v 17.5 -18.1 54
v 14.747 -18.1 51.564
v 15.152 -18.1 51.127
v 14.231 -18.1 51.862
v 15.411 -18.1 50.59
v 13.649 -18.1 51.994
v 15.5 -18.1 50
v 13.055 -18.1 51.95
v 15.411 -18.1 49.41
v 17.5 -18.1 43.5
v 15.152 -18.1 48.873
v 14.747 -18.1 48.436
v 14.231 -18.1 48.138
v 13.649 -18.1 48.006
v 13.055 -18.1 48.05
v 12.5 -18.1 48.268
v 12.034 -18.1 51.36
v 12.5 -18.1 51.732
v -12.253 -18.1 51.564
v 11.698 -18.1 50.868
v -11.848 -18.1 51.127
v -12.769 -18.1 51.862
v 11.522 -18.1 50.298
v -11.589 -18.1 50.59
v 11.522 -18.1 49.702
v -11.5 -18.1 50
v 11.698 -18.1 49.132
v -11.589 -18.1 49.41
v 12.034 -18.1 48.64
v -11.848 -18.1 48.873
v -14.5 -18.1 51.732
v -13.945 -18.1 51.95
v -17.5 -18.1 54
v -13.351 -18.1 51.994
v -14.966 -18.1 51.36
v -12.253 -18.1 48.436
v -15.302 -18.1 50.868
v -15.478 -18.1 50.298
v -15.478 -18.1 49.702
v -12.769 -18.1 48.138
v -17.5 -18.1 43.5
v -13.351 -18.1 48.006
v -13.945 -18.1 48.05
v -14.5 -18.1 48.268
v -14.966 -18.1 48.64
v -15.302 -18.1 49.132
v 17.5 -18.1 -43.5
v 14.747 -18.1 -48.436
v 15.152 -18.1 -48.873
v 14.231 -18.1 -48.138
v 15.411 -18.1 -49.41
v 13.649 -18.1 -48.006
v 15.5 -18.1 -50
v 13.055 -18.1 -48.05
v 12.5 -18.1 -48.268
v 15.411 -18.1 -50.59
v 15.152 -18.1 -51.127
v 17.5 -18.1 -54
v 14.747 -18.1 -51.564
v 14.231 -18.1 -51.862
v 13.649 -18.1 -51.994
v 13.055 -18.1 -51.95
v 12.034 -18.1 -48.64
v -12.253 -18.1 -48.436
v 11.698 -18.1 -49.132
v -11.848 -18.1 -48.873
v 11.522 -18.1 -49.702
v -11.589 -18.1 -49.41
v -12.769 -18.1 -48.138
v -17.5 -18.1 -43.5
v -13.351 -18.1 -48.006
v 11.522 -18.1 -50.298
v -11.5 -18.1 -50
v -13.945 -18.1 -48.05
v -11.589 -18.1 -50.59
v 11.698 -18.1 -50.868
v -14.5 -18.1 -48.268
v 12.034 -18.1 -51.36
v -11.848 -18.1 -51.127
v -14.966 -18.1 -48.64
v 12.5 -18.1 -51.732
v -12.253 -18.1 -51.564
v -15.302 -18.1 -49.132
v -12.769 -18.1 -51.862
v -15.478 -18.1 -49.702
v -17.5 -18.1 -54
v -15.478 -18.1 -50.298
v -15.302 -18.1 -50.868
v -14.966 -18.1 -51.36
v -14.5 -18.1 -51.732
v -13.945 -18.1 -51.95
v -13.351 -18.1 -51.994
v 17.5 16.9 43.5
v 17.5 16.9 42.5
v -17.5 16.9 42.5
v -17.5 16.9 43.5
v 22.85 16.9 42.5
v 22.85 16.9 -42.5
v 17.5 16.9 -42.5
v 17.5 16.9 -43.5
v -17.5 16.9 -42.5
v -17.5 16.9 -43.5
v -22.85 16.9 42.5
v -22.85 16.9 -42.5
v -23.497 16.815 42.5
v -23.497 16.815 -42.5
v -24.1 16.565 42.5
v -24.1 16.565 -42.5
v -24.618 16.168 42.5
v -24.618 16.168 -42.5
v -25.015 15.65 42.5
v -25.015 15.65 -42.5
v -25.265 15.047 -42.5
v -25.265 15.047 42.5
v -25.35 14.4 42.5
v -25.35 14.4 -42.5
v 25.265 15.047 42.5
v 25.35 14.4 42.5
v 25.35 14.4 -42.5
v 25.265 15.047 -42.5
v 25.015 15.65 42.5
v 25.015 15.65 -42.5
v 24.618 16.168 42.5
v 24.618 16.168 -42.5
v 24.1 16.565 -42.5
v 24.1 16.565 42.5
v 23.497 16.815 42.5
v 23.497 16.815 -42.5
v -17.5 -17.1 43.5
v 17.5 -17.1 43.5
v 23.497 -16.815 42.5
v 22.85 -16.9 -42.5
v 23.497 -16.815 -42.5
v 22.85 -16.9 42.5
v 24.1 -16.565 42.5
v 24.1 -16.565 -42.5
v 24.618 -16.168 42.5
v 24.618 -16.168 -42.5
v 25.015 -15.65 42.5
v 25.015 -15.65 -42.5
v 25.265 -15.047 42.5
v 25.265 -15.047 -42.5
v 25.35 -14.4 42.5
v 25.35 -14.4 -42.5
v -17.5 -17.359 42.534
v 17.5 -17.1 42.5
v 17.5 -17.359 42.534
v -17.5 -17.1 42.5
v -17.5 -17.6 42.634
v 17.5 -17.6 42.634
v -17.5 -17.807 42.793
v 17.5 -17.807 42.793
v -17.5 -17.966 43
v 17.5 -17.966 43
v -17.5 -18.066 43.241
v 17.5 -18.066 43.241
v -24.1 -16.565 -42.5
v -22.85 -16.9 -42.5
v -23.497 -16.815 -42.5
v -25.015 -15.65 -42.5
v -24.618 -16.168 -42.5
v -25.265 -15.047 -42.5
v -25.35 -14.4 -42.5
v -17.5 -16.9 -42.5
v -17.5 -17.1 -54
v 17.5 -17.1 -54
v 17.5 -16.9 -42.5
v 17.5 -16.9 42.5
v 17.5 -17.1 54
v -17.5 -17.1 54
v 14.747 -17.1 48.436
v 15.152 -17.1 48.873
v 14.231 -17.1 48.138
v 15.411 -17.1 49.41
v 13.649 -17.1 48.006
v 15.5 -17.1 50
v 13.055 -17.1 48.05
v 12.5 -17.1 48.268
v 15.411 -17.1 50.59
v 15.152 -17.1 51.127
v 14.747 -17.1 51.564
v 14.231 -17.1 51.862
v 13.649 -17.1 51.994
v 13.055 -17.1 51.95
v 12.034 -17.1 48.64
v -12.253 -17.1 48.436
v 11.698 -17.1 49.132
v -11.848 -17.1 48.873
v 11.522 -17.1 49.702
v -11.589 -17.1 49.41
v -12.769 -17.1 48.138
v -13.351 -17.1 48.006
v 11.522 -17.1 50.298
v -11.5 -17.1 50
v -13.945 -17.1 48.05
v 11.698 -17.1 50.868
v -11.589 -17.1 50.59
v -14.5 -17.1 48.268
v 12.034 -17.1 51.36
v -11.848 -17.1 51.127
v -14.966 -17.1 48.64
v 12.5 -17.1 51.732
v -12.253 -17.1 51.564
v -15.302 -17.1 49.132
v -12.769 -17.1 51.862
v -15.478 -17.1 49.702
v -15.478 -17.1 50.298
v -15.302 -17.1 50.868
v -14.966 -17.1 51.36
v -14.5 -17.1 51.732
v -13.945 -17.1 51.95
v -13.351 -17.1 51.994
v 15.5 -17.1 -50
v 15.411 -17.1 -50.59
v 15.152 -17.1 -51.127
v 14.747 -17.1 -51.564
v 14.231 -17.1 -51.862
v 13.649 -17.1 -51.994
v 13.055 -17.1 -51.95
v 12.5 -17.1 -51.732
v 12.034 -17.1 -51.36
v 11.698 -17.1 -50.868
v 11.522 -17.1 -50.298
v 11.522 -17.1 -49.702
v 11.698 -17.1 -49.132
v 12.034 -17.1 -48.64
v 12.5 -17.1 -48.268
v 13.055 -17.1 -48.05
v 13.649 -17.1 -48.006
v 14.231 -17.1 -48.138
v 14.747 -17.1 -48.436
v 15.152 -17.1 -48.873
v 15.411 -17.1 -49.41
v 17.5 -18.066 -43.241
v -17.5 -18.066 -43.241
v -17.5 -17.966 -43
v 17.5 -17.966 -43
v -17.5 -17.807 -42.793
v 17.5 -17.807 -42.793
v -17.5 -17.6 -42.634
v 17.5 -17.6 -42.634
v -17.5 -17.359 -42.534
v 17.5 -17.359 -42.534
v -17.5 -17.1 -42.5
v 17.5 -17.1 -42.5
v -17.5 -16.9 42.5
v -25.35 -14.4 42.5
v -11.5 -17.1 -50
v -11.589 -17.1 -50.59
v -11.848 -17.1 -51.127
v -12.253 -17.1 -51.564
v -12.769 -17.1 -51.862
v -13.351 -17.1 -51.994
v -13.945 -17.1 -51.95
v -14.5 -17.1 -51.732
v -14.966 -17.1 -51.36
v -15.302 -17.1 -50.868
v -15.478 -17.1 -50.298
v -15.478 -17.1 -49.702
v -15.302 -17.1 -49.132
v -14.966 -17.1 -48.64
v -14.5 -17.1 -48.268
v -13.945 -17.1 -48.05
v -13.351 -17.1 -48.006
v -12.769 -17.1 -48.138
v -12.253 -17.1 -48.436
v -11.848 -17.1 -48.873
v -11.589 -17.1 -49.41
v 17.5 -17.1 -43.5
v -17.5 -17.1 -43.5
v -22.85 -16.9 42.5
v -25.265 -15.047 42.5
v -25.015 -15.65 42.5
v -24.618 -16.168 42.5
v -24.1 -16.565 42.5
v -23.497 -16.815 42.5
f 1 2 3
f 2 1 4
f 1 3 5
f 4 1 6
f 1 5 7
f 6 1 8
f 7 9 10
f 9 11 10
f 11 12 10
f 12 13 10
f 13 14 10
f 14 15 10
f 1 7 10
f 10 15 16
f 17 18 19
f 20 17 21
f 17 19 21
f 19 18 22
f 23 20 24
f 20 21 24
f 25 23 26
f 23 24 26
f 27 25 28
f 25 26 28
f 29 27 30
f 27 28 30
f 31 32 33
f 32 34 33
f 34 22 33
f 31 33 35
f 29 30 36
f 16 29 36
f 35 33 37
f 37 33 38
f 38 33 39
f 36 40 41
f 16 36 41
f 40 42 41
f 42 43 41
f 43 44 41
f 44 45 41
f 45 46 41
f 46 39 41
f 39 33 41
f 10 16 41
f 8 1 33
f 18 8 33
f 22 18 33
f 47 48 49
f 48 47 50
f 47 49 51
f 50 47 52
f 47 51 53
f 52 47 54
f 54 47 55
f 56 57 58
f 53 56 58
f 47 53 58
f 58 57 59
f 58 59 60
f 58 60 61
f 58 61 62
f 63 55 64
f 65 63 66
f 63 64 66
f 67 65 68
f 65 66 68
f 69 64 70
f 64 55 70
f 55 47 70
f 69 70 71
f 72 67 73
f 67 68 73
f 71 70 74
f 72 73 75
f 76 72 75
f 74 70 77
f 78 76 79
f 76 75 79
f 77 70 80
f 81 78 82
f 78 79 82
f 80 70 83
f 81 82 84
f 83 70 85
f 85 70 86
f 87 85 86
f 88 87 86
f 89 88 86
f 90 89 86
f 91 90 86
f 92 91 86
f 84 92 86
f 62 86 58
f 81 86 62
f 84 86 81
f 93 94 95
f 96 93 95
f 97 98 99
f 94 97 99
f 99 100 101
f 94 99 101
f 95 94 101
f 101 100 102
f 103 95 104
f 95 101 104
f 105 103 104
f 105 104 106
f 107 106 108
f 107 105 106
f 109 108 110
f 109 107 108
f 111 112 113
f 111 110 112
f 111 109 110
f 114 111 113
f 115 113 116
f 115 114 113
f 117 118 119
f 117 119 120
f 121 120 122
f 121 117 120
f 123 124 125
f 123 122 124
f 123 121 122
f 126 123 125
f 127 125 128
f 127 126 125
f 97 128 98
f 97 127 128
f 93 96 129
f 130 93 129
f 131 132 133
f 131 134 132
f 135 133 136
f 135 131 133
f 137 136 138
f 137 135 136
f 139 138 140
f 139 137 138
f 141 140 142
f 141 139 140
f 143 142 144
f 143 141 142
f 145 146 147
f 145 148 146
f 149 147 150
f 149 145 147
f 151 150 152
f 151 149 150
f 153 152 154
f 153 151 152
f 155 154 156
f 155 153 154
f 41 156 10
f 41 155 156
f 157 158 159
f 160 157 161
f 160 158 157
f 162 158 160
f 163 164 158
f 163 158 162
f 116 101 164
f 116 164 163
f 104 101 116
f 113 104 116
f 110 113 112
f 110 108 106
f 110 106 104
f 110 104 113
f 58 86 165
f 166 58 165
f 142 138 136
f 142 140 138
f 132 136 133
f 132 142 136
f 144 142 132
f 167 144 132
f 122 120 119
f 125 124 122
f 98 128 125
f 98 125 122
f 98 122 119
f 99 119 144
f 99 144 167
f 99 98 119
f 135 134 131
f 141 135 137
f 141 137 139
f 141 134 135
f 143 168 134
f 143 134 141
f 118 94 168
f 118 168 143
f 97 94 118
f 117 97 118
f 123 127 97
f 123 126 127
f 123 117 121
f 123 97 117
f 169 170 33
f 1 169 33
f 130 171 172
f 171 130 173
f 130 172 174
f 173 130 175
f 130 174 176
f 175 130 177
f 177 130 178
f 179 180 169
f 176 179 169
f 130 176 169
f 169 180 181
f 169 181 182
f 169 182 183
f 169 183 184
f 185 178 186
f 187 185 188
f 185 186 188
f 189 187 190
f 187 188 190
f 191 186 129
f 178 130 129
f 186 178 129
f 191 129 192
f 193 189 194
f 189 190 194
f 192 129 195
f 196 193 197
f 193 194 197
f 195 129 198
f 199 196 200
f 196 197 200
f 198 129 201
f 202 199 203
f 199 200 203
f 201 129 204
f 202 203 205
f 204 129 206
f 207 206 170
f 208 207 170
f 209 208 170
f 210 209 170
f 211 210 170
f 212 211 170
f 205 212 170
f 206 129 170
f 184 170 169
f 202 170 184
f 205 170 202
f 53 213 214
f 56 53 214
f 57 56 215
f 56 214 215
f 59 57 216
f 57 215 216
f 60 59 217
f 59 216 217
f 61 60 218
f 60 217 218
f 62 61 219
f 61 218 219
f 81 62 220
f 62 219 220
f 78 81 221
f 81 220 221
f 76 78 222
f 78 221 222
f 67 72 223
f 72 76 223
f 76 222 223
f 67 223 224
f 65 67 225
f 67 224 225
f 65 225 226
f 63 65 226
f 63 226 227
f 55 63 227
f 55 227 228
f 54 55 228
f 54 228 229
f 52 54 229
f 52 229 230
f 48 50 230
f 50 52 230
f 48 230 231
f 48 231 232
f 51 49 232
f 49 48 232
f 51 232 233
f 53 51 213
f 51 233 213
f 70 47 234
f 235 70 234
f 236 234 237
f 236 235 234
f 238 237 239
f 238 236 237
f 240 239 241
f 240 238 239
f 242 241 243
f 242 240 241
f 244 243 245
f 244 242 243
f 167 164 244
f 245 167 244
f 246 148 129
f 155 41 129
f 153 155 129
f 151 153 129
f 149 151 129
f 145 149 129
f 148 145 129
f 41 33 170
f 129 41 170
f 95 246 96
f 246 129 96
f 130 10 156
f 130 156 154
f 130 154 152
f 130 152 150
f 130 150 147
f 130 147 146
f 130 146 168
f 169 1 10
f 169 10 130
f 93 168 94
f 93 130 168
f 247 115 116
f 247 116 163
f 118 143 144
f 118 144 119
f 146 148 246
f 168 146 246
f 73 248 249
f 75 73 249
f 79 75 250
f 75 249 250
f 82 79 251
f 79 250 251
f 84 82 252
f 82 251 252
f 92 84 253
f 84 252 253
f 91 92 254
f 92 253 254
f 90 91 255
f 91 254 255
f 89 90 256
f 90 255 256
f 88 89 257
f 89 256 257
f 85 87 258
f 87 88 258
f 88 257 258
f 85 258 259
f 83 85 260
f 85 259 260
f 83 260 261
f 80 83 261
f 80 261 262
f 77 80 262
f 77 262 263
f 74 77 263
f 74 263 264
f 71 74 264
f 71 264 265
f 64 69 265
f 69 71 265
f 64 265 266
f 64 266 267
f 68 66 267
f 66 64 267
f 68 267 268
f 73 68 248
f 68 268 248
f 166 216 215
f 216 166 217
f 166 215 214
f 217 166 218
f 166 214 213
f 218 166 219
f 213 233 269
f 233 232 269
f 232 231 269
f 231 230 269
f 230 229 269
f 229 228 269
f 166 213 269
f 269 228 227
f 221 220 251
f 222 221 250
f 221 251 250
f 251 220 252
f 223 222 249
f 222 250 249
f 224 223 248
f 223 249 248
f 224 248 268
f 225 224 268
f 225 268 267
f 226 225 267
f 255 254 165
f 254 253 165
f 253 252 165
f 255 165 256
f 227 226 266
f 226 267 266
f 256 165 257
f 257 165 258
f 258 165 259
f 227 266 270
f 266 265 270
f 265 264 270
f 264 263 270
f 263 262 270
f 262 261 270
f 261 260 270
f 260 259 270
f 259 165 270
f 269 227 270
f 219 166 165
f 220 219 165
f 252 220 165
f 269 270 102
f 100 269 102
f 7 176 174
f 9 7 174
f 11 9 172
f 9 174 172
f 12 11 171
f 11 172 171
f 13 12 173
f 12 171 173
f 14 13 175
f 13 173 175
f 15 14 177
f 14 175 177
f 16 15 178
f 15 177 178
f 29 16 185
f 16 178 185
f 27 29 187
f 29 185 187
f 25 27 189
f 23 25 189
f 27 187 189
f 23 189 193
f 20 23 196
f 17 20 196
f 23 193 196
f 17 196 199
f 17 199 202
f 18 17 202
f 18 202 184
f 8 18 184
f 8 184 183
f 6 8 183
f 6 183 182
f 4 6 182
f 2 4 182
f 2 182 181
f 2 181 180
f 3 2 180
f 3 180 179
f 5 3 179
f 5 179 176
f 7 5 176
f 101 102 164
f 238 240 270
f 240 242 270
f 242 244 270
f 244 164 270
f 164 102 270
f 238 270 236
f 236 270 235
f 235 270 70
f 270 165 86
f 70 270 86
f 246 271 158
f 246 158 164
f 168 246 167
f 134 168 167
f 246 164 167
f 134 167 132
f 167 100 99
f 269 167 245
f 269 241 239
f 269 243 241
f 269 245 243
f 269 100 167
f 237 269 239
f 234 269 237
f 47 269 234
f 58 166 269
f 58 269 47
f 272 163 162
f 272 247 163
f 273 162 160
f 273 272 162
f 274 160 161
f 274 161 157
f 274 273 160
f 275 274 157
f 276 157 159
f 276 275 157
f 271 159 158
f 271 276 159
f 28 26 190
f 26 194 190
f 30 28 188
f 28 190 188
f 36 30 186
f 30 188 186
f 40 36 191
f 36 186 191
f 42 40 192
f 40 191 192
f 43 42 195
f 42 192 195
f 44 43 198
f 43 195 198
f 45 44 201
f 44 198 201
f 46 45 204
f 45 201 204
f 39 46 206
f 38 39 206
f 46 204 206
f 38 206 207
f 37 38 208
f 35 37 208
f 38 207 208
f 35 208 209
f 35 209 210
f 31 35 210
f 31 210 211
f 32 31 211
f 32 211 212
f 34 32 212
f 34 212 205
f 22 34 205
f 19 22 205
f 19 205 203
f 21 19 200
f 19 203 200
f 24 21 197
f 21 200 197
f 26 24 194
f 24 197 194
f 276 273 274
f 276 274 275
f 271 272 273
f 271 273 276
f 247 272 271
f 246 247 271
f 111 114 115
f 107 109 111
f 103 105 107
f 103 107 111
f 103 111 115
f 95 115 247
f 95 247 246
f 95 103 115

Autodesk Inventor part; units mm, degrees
ref_plane "YZ Plane" through (0, 0, 0) normal (1, 0, 0) x (0, 1, 0)
ref_plane "XZ Plane" through (0, 0, 0) normal (0, 1, 0) x (-1, 0, 0)
ref_plane "XY Plane" through (0, 0, 0) normal (0, 0, 1) x (1, 0, 0)
sketch "Sketch1" plane through (0, 0, 0) normal (0, 0, 1) x (1, 0, 0)
  line L0 (-25.35, -16.9) -> (25.35, -16.9)
  line L1 (25.35, -16.9) -> (25.35, 16.9)
  line L2 (25.35, 16.9) -> (-25.35, 16.9)
  line L3 (-25.35, 16.9) -> (-25.35, -16.9)
  line L4 (-25.35, -16.9) -> (25.35, 16.9) construction
  line L5 (25.35, -16.9) -> (-25.35, 16.9) construction
  point P0 (0, 0)
  dimension "d0" = 50.7
  dimension "d1" = 33.8
extrude "Extrusion1" add sketch "Sketch1" along normal blind 42.5
sketch "Sketch3" plane through (0, 0, 0) normal (1, 0, 0) x (0, 1, 0)
  line L0 (16.9, 42.5) -> (16.9, 0) projected
  line L1 (16.9, 0) -> (-16.9, 0) projected
  line L2 (-16.9, 0) -> (-16.9, 42.5) projected
  line L3 (-16.9, 42.5) -> (16.9, 42.5) projected
  line L4 (16.9, 42.5) -> (16.9, 43.5)
  line L5 (16.9, 43.5) -> (-17.1, 43.5)
  line L6 (-17.1, 43.5) -> (-17.1, 54)
  line L7 (-17.1, 54) -> (-18.1, 54)
  line L8 (-18.1, 54) -> (-18.1, 43.5)
  line L9 (-17.1, 42.5) -> (-16.9, 42.5)
  arc A0 (-18.1, 43.5) -> (-17.1, 42.5) centre (-17.1, 43.5) ccw
  point P0 (0, 0)
  dimension "d4" = 1
  dimension "d5" = 1
  dimension "d6" = 35
  dimension "d7" = 1
  dimension "d8" = 54
extrude "Extrusion2" add sketch "Sketch3" along normal mid plane 35 contours L3 L9 A0 L8 L7 L6 L5 L4
fillet "Fillet2" radius 2.5 4 edges at (25.35, -16.9, 21.25) (25.35, 16.9, 21.25) (-25.35, 16.9, 21.25) (-25.35, -16.9, 21.25)
sketch "Sketch4" plane through (-17.5, -17.1, 54) normal (0, 1, 0) x (1, 0, 0)
  line L0 (17.5, 54) -> (17.5, 4) construction
  line L1 (4, 4) -> (31, 4) construction
  circle A0 centre (4, 4) radius 2
  circle A1 centre (31, 4) radius 2
  dimension "d13" = 4
  dimension "d14" = 50
  dimension "d15" = 27
extrude "Extrusion3" cut sketch "Sketch4" against normal through all
mirror "Mirror1" about plane through (0, 0, 0) normal (0, 0, 1)
properties part number "esc"
